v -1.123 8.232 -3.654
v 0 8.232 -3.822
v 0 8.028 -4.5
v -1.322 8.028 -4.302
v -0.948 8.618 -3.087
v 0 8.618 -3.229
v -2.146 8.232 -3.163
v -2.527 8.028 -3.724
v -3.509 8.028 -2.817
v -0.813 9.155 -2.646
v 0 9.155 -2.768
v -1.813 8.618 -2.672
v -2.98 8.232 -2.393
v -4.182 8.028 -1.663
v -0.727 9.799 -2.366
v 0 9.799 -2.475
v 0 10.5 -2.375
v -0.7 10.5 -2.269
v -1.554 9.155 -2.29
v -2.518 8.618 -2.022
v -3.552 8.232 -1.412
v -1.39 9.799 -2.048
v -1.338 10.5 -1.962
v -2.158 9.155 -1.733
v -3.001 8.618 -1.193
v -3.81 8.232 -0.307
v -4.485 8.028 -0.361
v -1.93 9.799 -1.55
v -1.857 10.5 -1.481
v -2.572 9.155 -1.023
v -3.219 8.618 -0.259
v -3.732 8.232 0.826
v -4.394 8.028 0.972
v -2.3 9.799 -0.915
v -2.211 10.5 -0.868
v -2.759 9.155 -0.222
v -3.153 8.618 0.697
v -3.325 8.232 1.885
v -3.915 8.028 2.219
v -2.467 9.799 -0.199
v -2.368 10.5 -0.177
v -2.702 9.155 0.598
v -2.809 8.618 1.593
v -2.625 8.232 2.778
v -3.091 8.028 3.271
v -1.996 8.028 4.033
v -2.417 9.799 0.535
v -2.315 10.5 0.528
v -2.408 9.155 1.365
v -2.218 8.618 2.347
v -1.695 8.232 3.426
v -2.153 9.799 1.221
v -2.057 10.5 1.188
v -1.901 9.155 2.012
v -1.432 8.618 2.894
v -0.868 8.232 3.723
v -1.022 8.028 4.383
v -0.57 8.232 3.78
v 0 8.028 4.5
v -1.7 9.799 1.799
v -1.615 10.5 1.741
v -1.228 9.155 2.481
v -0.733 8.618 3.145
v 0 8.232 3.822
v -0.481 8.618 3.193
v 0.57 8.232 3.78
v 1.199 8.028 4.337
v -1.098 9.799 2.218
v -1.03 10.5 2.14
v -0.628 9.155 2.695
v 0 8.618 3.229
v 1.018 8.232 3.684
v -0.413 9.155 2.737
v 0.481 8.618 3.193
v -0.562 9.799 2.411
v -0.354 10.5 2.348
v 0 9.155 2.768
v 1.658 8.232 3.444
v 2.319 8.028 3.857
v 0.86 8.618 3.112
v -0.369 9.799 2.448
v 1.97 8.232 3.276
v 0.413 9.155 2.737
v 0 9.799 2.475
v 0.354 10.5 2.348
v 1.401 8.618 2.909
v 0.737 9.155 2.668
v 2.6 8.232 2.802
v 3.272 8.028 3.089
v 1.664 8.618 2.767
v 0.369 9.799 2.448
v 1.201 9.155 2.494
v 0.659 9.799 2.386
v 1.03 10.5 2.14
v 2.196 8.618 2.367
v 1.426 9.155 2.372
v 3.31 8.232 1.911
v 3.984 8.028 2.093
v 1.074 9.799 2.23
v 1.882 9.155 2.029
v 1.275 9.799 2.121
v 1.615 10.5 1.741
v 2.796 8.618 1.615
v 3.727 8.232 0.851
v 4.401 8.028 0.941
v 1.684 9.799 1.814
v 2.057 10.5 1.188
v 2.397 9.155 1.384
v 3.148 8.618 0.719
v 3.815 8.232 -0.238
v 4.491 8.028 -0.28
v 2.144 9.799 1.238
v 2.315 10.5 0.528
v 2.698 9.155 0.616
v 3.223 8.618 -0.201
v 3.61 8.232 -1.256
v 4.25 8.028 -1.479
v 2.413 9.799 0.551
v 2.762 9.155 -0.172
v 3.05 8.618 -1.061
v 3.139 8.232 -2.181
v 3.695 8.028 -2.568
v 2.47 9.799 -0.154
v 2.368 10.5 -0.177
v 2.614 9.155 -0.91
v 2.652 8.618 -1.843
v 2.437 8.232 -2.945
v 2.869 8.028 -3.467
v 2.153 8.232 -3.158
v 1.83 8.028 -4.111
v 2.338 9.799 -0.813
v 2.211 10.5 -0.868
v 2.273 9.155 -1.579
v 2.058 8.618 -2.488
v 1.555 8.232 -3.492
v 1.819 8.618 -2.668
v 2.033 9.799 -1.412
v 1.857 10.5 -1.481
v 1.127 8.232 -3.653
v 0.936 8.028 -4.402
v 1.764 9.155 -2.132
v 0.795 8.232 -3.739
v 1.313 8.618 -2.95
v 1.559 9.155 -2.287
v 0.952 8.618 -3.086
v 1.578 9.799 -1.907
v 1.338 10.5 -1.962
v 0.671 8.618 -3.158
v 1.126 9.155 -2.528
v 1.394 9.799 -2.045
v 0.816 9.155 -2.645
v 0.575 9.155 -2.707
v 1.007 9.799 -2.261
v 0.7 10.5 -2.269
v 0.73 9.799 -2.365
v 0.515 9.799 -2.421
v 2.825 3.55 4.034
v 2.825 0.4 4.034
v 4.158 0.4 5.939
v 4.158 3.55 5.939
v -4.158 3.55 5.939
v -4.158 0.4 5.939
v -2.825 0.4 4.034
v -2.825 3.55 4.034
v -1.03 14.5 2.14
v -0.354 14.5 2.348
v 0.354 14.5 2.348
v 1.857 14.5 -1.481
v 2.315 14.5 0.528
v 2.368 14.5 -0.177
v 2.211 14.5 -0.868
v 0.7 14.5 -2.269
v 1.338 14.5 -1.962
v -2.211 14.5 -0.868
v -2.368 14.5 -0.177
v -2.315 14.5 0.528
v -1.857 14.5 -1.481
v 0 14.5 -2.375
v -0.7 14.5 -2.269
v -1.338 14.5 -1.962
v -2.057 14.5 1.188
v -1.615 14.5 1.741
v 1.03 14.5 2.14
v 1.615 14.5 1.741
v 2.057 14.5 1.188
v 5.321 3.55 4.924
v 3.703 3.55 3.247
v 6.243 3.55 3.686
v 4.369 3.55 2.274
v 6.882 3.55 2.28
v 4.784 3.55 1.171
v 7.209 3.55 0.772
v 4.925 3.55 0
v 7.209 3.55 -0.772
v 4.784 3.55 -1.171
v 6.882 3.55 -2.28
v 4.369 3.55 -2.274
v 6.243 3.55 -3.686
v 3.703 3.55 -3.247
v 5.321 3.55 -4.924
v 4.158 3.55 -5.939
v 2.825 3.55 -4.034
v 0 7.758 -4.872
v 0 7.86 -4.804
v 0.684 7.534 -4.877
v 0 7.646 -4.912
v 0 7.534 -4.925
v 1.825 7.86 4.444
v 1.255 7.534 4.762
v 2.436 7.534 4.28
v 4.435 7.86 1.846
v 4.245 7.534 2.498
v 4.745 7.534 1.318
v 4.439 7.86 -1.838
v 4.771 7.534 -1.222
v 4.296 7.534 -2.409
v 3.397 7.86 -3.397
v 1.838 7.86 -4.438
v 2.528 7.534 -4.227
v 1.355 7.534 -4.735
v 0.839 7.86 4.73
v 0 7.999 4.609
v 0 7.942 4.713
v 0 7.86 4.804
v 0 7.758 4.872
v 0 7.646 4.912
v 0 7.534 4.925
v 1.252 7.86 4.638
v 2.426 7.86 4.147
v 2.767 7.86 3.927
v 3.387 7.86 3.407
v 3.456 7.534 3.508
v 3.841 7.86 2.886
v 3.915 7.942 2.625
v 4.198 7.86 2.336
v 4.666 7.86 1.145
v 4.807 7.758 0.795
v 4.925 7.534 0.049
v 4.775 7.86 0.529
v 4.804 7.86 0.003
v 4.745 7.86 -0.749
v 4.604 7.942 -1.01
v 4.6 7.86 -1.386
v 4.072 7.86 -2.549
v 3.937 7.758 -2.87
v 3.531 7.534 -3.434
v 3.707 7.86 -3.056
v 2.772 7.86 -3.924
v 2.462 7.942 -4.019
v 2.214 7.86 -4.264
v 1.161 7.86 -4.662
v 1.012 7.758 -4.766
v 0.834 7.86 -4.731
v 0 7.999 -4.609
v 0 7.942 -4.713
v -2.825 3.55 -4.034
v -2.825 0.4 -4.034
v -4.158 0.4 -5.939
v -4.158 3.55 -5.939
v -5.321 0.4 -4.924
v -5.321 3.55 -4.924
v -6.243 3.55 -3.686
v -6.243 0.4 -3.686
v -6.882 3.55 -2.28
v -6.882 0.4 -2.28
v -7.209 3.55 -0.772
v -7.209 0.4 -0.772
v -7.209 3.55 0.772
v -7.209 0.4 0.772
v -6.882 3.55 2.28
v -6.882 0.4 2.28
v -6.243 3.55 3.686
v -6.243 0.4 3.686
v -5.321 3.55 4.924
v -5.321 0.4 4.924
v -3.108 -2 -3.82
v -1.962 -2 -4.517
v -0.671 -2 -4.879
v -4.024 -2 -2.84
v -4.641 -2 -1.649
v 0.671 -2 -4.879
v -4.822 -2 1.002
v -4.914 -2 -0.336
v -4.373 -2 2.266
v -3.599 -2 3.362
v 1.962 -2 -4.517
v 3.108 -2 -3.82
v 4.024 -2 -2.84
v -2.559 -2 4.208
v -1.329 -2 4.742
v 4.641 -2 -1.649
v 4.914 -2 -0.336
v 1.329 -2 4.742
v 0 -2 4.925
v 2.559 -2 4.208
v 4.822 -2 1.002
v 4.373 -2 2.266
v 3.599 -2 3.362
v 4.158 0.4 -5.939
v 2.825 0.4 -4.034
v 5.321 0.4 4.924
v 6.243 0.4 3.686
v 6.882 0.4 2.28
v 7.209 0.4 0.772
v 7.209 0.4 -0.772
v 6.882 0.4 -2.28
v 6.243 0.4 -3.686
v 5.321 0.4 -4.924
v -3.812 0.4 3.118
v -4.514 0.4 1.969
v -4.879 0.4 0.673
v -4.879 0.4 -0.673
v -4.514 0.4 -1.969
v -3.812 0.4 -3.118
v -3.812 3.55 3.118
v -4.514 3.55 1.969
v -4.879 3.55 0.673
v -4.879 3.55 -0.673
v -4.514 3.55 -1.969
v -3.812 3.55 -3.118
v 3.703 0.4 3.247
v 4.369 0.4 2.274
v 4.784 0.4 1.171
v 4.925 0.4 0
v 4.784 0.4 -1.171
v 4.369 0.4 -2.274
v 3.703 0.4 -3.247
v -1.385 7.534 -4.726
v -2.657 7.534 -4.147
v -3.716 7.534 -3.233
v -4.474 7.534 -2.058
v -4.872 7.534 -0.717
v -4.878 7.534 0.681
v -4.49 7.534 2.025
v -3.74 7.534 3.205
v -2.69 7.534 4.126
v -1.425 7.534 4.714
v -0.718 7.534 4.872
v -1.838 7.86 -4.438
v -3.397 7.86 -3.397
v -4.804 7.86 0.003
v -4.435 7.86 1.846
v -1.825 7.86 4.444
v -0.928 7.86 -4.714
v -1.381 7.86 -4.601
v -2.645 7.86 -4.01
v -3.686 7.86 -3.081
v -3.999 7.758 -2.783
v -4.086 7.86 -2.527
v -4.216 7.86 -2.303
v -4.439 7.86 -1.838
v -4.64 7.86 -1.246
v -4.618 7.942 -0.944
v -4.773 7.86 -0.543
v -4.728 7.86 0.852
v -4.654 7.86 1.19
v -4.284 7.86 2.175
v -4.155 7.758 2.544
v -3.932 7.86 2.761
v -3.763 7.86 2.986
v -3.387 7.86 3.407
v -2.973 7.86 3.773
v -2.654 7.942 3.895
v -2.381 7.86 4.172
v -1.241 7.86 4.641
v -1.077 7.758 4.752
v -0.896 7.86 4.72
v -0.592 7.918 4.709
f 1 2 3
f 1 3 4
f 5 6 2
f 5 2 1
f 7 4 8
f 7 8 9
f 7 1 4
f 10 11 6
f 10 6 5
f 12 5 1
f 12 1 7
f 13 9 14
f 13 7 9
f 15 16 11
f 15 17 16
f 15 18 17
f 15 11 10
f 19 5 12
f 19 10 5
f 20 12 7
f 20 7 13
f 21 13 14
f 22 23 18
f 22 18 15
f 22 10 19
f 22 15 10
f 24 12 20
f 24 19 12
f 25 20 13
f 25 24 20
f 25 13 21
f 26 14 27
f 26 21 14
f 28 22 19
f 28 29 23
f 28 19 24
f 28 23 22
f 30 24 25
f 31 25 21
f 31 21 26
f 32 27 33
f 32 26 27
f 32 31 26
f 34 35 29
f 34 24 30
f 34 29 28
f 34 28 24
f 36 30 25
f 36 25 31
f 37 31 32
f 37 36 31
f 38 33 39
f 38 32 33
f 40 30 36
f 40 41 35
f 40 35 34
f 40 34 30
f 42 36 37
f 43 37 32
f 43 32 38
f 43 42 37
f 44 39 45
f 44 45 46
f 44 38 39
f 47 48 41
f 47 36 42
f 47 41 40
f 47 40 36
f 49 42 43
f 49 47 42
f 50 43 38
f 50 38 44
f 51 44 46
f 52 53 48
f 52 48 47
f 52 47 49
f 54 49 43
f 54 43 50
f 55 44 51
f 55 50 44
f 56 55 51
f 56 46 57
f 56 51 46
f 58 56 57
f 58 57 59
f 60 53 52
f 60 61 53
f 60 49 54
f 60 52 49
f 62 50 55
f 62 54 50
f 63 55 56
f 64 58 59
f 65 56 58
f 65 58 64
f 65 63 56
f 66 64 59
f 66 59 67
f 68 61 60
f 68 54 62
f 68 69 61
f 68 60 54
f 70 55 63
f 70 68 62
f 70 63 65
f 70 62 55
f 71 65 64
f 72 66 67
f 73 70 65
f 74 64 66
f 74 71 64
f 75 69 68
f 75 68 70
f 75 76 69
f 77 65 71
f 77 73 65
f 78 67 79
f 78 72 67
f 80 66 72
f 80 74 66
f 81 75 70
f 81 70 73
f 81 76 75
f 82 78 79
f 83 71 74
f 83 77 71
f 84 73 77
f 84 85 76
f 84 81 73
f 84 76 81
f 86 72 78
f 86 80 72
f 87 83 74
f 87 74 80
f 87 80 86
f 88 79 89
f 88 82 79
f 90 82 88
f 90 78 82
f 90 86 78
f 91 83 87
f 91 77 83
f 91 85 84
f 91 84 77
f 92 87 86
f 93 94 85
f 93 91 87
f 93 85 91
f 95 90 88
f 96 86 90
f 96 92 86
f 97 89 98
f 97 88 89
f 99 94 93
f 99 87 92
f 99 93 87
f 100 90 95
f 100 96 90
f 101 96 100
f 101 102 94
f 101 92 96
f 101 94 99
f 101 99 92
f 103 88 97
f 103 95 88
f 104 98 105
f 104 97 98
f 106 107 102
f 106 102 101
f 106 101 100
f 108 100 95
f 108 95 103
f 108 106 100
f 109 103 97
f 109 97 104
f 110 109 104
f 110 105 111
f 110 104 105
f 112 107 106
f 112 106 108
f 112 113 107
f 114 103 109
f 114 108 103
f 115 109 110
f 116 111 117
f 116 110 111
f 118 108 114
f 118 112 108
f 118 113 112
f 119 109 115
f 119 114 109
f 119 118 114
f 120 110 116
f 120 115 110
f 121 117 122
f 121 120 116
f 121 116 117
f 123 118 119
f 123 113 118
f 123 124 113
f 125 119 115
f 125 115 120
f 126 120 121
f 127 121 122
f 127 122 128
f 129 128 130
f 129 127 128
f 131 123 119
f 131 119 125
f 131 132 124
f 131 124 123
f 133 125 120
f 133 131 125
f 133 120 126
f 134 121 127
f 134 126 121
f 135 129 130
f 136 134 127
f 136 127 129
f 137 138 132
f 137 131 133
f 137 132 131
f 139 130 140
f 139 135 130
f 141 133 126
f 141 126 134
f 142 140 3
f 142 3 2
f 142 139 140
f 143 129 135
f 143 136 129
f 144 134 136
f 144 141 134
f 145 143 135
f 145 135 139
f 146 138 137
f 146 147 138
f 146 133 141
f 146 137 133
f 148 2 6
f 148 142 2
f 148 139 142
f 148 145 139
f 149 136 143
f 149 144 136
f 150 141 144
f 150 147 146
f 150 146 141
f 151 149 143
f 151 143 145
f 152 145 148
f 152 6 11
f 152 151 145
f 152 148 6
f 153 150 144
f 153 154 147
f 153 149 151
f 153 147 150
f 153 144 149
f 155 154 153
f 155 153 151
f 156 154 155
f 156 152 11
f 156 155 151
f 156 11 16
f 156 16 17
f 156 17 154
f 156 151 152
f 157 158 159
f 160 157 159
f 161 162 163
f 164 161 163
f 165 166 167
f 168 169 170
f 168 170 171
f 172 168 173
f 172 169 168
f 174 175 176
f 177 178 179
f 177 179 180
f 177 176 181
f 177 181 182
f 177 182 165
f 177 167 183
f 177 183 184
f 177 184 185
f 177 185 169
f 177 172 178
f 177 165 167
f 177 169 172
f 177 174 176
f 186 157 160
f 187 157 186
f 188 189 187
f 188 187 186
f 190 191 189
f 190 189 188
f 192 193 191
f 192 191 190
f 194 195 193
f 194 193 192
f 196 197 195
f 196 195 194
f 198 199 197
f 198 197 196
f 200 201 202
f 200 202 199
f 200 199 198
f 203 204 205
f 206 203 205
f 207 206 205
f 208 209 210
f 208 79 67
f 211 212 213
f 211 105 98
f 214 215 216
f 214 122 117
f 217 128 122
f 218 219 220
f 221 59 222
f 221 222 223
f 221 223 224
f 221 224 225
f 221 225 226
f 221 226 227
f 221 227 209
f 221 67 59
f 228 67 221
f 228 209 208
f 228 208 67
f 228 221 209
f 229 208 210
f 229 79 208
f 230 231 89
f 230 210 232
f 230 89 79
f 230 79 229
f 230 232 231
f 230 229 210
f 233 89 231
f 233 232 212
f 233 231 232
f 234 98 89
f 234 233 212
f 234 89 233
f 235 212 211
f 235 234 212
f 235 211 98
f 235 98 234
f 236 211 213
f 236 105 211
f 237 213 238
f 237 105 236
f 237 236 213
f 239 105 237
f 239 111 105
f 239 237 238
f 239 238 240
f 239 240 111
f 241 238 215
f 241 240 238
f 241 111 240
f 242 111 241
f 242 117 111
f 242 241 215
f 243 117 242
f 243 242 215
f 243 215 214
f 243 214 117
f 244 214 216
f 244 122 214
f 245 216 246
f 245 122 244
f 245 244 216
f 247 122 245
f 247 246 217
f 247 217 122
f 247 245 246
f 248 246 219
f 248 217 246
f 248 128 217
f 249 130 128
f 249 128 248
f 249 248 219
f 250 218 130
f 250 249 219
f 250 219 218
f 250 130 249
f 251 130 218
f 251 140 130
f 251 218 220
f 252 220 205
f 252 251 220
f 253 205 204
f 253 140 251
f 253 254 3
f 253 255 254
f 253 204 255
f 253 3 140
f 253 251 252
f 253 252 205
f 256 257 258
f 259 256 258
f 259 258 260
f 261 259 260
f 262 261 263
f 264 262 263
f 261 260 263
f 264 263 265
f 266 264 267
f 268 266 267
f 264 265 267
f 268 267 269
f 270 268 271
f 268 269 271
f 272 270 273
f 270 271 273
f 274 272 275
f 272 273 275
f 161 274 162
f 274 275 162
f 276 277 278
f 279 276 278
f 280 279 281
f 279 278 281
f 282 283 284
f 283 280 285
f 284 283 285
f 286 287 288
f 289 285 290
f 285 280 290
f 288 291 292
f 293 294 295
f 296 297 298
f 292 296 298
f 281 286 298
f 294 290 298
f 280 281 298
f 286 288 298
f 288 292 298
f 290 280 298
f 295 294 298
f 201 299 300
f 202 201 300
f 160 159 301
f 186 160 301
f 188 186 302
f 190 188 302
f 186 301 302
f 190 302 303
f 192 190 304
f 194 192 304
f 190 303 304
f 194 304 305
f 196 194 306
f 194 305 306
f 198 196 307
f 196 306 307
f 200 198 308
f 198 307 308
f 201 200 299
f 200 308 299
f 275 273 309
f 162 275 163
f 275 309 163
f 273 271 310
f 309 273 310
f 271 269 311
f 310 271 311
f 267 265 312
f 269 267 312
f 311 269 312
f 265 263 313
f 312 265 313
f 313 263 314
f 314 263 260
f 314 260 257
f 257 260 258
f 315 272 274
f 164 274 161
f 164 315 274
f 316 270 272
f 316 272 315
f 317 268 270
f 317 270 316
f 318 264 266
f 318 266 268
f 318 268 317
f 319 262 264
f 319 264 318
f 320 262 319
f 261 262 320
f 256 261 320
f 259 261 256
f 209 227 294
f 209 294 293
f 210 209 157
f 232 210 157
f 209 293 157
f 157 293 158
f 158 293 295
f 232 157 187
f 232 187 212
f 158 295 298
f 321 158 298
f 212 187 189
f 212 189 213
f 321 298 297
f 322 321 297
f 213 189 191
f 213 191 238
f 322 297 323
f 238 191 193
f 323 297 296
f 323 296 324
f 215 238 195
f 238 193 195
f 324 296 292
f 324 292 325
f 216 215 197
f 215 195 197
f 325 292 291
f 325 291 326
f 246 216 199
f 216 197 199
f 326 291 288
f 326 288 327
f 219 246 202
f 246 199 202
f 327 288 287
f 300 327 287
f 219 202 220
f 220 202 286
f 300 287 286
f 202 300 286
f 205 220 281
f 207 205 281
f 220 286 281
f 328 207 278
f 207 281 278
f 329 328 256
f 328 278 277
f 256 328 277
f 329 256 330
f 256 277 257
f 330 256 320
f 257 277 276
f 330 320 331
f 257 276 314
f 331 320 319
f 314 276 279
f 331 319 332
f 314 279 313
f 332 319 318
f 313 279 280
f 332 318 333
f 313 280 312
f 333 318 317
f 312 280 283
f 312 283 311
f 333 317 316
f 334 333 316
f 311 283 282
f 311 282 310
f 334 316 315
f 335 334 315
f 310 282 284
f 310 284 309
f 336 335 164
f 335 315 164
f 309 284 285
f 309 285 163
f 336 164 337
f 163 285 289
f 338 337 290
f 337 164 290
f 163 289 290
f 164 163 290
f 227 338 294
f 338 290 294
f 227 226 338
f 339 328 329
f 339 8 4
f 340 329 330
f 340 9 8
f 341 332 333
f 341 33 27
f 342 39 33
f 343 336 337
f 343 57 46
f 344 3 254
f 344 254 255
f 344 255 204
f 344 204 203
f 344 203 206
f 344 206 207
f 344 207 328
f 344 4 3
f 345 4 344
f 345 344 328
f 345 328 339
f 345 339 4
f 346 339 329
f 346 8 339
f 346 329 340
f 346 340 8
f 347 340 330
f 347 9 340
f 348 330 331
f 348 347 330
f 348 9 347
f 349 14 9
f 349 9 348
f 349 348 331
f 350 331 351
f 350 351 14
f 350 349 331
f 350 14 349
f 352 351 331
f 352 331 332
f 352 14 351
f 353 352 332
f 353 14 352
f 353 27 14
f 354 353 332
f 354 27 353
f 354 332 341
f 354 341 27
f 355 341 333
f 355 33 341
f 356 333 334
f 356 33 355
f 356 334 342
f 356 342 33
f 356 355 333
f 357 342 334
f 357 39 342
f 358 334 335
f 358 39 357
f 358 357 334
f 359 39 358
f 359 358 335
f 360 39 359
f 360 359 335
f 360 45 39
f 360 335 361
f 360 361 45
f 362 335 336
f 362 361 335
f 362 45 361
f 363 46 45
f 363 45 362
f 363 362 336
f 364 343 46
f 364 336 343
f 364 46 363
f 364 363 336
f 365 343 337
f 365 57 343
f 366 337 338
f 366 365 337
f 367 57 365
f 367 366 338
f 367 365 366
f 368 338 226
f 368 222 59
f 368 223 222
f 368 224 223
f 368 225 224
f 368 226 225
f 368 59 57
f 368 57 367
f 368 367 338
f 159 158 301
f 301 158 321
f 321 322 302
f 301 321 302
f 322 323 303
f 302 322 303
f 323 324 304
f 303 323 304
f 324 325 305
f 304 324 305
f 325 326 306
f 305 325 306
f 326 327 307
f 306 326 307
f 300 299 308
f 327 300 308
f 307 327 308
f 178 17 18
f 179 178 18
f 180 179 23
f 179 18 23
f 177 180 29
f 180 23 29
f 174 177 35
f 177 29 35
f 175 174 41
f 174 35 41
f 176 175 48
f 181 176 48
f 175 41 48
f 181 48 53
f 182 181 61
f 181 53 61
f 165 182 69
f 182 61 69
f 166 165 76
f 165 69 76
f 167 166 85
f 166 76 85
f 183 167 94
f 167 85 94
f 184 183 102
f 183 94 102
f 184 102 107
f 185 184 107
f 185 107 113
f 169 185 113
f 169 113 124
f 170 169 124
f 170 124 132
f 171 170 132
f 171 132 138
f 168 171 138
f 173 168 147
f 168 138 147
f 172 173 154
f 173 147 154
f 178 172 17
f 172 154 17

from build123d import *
from build123d.topology import SkipClean

# Parameters (mm, degrees)
SALIENTE_EXTRUIR1_START   = 0.4
SALIENTE_EXTRUIR1_DEPTH   = 3.15
SALIENTE_EXTRUIR1_2_DEPTH = 3.15
SALIENTE_EXTRUIR2_DEPTH   = 8
SALIENTE_EXTRUIR3_START   = -2
SALIENTE_EXTRUIR3_DEPTH   = 2
CROQUIS2_R                = 2.375
SALIENTE_EXTRUIR4_DEPTH   = 6.5
REDONDEO2_R               = 2.5
REDONDEO3_R               = 0.5


with BuildPart() as part:
    # Croquis1 → Saliente-Extruir1 (new body)
    with BuildSketch(Plane(origin=(0, 0, 0), x_dir=(1, 0, 0), z_dir=(0, 1, 0)).offset(SALIENTE_EXTRUIR1_START)):
        with BuildLine():
            Line((4.158429164, 5.938852321), (2.824863949, 4.034323818))
            ThreePointArc((2.824863949, 4.034323818), (4.925, 0), (2.824863949, -4.034323818))
            Line((2.824863949, -4.034323818), (4.158429164, -5.938852321))
            ThreePointArc((4.158429164, -5.938852321), (7.25, 0), (4.158429164, 5.938852321))
        make_face()
    extrude(amount=SALIENTE_EXTRUIR1_DEPTH)



with BuildPart() as body_2:
    # Croquis1 → Saliente-Extruir1 2 (new body)
    with BuildSketch(Plane(origin=(0, 0, 0), x_dir=(1, 0, 0), z_dir=(0, 1, 0)).offset(SALIENTE_EXTRUIR1_START)):
        with BuildLine():
            ThreePointArc((-2.824863949, -4.034323818), (-4.925, 0), (-2.824863949, 4.034323818))
            Line((-2.824863949, 4.034323818), (-4.158429164, 5.938852321))
            ThreePointArc((-4.158429164, 5.938852321), (-7.25, 0), (-4.158429164, -5.938852321))
            Line((-4.158429164, -5.938852321), (-2.824863949, -4.034323818))
        make_face()
    extrude(amount=SALIENTE_EXTRUIR1_2_DEPTH)


with BuildPart() as part_1:
    add(part.part)

    add(body_2.part)  # Saliente-Extruir2 merges body 2
    # Croquis1<3> → Saliente-Extruir2 (add)
    with BuildSketch(Plane(origin=(0, 0, 0), x_dir=(1, 0, 0), z_dir=(0, 1, 0))):
        with BuildLine():
            ThreePointArc((4.925, 0), (4.368528353, 2.27411192), (2.824863949, 4.034323818))
            ThreePointArc((2.824863949, 4.034323818), (0, 4.925), (-2.824863949, 4.034323818))
            ThreePointArc((-2.824863949, 4.034323818), (-4.925, 0), (-2.824863949, -4.034323818))
            ThreePointArc((-2.824863949, -4.034323818), (0, -4.925), (2.824863949, -4.034323818))
            ThreePointArc((2.824863949, -4.034323818), (4.368528353, -2.27411192), (4.925, 0))
        make_face()
    extrude(amount=SALIENTE_EXTRUIR2_DEPTH)

    # Croquis1<4> → Saliente-Extruir3 (add)
    with SkipClean():  # the faces are left unmerged after this step: merging them gives an invalid solid
        with BuildSketch(Plane(origin=(0, 0, 0), x_dir=(1, 0, 0), z_dir=(0, 1, 0)).offset(SALIENTE_EXTRUIR3_START)):
            with BuildLine():
                ThreePointArc((4.925, 0), (4.368528353, 2.27411192), (2.824863949, 4.034323818))
                ThreePointArc((2.824863949, 4.034323818), (0, 4.925), (-2.824863949, 4.034323818))
                ThreePointArc((-2.824863949, 4.034323818), (-4.925, 0), (-2.824863949, -4.034323818))
                ThreePointArc((-2.824863949, -4.034323818), (0, -4.925), (2.824863949, -4.034323818))
                ThreePointArc((2.824863949, -4.034323818), (4.368528353, -2.27411192), (4.925, 0))
            make_face()
        extrude(amount=SALIENTE_EXTRUIR3_DEPTH)

    # Croquis2 → Saliente-Extruir4 (add)
    with SkipClean():  # the faces are left unmerged after this step: merging them gives an invalid solid
        with BuildSketch(Plane(origin=(0, 8, 0), x_dir=(1, 0, 0), z_dir=(0, 1, 0))):
            Circle(CROQUIS2_R)
        extrude(amount=SALIENTE_EXTRUIR4_DEPTH)

    # Redondeo2
    redondeo2_edges = [part_1.edges().sort_by_distance(p)[0] for p in [
        (-2.375, 8, 0),
    ]]
    fillet(redondeo2_edges, radius=REDONDEO2_R)

    # Redondeo3
    redondeo3_edges = [part_1.edges().sort_by_distance(p)[0] for p in [
        (-2.824863949, 8, 4.034323818),
    ]]
    fillet(redondeo3_edges, radius=REDONDEO3_R)


solid = part_1.part
